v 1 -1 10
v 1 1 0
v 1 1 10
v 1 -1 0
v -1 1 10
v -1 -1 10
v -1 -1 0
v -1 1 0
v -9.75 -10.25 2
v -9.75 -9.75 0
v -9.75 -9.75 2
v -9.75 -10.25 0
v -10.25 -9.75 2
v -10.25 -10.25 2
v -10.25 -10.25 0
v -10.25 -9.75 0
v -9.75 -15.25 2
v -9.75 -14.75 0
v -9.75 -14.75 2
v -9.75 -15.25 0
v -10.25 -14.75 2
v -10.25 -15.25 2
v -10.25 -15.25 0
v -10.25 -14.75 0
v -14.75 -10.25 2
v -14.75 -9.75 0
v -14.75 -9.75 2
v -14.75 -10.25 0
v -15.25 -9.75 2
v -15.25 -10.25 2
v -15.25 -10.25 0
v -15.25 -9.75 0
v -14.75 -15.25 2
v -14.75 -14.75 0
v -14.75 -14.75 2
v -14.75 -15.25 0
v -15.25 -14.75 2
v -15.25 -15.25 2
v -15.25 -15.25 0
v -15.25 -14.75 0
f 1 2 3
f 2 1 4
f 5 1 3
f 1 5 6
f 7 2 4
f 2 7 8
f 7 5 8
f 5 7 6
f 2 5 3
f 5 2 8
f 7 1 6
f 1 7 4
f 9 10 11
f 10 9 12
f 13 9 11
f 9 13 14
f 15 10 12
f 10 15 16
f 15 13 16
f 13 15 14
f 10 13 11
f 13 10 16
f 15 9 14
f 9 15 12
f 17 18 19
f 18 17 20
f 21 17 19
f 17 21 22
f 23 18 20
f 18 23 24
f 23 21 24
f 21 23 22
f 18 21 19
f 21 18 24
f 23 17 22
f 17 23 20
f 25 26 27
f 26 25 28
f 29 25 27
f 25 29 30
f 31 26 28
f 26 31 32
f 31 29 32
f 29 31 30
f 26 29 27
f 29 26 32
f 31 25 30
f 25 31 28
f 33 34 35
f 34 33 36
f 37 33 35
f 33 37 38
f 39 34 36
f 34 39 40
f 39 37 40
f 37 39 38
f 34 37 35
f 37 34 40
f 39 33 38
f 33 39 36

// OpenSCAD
translate([0, 0, 5]) color([0,1,0,0.9]) cube([2, 2, 10], center=true);
translate([-10.0, -10.0, 1]) color([1,0,0]) cube([0.5, 0.5, 2], center=true);
translate([-10.0, -15.0, 1]) color([1,0,0]) cube([0.5, 0.5, 2], center=true);
translate([-15.0, -10.0, 1]) color([1,0,0]) cube([0.5, 0.5, 2], center=true);
translate([-15.0, -15.0, 1]) color([1,0,0]) cube([0.5, 0.5, 2], center=true);
